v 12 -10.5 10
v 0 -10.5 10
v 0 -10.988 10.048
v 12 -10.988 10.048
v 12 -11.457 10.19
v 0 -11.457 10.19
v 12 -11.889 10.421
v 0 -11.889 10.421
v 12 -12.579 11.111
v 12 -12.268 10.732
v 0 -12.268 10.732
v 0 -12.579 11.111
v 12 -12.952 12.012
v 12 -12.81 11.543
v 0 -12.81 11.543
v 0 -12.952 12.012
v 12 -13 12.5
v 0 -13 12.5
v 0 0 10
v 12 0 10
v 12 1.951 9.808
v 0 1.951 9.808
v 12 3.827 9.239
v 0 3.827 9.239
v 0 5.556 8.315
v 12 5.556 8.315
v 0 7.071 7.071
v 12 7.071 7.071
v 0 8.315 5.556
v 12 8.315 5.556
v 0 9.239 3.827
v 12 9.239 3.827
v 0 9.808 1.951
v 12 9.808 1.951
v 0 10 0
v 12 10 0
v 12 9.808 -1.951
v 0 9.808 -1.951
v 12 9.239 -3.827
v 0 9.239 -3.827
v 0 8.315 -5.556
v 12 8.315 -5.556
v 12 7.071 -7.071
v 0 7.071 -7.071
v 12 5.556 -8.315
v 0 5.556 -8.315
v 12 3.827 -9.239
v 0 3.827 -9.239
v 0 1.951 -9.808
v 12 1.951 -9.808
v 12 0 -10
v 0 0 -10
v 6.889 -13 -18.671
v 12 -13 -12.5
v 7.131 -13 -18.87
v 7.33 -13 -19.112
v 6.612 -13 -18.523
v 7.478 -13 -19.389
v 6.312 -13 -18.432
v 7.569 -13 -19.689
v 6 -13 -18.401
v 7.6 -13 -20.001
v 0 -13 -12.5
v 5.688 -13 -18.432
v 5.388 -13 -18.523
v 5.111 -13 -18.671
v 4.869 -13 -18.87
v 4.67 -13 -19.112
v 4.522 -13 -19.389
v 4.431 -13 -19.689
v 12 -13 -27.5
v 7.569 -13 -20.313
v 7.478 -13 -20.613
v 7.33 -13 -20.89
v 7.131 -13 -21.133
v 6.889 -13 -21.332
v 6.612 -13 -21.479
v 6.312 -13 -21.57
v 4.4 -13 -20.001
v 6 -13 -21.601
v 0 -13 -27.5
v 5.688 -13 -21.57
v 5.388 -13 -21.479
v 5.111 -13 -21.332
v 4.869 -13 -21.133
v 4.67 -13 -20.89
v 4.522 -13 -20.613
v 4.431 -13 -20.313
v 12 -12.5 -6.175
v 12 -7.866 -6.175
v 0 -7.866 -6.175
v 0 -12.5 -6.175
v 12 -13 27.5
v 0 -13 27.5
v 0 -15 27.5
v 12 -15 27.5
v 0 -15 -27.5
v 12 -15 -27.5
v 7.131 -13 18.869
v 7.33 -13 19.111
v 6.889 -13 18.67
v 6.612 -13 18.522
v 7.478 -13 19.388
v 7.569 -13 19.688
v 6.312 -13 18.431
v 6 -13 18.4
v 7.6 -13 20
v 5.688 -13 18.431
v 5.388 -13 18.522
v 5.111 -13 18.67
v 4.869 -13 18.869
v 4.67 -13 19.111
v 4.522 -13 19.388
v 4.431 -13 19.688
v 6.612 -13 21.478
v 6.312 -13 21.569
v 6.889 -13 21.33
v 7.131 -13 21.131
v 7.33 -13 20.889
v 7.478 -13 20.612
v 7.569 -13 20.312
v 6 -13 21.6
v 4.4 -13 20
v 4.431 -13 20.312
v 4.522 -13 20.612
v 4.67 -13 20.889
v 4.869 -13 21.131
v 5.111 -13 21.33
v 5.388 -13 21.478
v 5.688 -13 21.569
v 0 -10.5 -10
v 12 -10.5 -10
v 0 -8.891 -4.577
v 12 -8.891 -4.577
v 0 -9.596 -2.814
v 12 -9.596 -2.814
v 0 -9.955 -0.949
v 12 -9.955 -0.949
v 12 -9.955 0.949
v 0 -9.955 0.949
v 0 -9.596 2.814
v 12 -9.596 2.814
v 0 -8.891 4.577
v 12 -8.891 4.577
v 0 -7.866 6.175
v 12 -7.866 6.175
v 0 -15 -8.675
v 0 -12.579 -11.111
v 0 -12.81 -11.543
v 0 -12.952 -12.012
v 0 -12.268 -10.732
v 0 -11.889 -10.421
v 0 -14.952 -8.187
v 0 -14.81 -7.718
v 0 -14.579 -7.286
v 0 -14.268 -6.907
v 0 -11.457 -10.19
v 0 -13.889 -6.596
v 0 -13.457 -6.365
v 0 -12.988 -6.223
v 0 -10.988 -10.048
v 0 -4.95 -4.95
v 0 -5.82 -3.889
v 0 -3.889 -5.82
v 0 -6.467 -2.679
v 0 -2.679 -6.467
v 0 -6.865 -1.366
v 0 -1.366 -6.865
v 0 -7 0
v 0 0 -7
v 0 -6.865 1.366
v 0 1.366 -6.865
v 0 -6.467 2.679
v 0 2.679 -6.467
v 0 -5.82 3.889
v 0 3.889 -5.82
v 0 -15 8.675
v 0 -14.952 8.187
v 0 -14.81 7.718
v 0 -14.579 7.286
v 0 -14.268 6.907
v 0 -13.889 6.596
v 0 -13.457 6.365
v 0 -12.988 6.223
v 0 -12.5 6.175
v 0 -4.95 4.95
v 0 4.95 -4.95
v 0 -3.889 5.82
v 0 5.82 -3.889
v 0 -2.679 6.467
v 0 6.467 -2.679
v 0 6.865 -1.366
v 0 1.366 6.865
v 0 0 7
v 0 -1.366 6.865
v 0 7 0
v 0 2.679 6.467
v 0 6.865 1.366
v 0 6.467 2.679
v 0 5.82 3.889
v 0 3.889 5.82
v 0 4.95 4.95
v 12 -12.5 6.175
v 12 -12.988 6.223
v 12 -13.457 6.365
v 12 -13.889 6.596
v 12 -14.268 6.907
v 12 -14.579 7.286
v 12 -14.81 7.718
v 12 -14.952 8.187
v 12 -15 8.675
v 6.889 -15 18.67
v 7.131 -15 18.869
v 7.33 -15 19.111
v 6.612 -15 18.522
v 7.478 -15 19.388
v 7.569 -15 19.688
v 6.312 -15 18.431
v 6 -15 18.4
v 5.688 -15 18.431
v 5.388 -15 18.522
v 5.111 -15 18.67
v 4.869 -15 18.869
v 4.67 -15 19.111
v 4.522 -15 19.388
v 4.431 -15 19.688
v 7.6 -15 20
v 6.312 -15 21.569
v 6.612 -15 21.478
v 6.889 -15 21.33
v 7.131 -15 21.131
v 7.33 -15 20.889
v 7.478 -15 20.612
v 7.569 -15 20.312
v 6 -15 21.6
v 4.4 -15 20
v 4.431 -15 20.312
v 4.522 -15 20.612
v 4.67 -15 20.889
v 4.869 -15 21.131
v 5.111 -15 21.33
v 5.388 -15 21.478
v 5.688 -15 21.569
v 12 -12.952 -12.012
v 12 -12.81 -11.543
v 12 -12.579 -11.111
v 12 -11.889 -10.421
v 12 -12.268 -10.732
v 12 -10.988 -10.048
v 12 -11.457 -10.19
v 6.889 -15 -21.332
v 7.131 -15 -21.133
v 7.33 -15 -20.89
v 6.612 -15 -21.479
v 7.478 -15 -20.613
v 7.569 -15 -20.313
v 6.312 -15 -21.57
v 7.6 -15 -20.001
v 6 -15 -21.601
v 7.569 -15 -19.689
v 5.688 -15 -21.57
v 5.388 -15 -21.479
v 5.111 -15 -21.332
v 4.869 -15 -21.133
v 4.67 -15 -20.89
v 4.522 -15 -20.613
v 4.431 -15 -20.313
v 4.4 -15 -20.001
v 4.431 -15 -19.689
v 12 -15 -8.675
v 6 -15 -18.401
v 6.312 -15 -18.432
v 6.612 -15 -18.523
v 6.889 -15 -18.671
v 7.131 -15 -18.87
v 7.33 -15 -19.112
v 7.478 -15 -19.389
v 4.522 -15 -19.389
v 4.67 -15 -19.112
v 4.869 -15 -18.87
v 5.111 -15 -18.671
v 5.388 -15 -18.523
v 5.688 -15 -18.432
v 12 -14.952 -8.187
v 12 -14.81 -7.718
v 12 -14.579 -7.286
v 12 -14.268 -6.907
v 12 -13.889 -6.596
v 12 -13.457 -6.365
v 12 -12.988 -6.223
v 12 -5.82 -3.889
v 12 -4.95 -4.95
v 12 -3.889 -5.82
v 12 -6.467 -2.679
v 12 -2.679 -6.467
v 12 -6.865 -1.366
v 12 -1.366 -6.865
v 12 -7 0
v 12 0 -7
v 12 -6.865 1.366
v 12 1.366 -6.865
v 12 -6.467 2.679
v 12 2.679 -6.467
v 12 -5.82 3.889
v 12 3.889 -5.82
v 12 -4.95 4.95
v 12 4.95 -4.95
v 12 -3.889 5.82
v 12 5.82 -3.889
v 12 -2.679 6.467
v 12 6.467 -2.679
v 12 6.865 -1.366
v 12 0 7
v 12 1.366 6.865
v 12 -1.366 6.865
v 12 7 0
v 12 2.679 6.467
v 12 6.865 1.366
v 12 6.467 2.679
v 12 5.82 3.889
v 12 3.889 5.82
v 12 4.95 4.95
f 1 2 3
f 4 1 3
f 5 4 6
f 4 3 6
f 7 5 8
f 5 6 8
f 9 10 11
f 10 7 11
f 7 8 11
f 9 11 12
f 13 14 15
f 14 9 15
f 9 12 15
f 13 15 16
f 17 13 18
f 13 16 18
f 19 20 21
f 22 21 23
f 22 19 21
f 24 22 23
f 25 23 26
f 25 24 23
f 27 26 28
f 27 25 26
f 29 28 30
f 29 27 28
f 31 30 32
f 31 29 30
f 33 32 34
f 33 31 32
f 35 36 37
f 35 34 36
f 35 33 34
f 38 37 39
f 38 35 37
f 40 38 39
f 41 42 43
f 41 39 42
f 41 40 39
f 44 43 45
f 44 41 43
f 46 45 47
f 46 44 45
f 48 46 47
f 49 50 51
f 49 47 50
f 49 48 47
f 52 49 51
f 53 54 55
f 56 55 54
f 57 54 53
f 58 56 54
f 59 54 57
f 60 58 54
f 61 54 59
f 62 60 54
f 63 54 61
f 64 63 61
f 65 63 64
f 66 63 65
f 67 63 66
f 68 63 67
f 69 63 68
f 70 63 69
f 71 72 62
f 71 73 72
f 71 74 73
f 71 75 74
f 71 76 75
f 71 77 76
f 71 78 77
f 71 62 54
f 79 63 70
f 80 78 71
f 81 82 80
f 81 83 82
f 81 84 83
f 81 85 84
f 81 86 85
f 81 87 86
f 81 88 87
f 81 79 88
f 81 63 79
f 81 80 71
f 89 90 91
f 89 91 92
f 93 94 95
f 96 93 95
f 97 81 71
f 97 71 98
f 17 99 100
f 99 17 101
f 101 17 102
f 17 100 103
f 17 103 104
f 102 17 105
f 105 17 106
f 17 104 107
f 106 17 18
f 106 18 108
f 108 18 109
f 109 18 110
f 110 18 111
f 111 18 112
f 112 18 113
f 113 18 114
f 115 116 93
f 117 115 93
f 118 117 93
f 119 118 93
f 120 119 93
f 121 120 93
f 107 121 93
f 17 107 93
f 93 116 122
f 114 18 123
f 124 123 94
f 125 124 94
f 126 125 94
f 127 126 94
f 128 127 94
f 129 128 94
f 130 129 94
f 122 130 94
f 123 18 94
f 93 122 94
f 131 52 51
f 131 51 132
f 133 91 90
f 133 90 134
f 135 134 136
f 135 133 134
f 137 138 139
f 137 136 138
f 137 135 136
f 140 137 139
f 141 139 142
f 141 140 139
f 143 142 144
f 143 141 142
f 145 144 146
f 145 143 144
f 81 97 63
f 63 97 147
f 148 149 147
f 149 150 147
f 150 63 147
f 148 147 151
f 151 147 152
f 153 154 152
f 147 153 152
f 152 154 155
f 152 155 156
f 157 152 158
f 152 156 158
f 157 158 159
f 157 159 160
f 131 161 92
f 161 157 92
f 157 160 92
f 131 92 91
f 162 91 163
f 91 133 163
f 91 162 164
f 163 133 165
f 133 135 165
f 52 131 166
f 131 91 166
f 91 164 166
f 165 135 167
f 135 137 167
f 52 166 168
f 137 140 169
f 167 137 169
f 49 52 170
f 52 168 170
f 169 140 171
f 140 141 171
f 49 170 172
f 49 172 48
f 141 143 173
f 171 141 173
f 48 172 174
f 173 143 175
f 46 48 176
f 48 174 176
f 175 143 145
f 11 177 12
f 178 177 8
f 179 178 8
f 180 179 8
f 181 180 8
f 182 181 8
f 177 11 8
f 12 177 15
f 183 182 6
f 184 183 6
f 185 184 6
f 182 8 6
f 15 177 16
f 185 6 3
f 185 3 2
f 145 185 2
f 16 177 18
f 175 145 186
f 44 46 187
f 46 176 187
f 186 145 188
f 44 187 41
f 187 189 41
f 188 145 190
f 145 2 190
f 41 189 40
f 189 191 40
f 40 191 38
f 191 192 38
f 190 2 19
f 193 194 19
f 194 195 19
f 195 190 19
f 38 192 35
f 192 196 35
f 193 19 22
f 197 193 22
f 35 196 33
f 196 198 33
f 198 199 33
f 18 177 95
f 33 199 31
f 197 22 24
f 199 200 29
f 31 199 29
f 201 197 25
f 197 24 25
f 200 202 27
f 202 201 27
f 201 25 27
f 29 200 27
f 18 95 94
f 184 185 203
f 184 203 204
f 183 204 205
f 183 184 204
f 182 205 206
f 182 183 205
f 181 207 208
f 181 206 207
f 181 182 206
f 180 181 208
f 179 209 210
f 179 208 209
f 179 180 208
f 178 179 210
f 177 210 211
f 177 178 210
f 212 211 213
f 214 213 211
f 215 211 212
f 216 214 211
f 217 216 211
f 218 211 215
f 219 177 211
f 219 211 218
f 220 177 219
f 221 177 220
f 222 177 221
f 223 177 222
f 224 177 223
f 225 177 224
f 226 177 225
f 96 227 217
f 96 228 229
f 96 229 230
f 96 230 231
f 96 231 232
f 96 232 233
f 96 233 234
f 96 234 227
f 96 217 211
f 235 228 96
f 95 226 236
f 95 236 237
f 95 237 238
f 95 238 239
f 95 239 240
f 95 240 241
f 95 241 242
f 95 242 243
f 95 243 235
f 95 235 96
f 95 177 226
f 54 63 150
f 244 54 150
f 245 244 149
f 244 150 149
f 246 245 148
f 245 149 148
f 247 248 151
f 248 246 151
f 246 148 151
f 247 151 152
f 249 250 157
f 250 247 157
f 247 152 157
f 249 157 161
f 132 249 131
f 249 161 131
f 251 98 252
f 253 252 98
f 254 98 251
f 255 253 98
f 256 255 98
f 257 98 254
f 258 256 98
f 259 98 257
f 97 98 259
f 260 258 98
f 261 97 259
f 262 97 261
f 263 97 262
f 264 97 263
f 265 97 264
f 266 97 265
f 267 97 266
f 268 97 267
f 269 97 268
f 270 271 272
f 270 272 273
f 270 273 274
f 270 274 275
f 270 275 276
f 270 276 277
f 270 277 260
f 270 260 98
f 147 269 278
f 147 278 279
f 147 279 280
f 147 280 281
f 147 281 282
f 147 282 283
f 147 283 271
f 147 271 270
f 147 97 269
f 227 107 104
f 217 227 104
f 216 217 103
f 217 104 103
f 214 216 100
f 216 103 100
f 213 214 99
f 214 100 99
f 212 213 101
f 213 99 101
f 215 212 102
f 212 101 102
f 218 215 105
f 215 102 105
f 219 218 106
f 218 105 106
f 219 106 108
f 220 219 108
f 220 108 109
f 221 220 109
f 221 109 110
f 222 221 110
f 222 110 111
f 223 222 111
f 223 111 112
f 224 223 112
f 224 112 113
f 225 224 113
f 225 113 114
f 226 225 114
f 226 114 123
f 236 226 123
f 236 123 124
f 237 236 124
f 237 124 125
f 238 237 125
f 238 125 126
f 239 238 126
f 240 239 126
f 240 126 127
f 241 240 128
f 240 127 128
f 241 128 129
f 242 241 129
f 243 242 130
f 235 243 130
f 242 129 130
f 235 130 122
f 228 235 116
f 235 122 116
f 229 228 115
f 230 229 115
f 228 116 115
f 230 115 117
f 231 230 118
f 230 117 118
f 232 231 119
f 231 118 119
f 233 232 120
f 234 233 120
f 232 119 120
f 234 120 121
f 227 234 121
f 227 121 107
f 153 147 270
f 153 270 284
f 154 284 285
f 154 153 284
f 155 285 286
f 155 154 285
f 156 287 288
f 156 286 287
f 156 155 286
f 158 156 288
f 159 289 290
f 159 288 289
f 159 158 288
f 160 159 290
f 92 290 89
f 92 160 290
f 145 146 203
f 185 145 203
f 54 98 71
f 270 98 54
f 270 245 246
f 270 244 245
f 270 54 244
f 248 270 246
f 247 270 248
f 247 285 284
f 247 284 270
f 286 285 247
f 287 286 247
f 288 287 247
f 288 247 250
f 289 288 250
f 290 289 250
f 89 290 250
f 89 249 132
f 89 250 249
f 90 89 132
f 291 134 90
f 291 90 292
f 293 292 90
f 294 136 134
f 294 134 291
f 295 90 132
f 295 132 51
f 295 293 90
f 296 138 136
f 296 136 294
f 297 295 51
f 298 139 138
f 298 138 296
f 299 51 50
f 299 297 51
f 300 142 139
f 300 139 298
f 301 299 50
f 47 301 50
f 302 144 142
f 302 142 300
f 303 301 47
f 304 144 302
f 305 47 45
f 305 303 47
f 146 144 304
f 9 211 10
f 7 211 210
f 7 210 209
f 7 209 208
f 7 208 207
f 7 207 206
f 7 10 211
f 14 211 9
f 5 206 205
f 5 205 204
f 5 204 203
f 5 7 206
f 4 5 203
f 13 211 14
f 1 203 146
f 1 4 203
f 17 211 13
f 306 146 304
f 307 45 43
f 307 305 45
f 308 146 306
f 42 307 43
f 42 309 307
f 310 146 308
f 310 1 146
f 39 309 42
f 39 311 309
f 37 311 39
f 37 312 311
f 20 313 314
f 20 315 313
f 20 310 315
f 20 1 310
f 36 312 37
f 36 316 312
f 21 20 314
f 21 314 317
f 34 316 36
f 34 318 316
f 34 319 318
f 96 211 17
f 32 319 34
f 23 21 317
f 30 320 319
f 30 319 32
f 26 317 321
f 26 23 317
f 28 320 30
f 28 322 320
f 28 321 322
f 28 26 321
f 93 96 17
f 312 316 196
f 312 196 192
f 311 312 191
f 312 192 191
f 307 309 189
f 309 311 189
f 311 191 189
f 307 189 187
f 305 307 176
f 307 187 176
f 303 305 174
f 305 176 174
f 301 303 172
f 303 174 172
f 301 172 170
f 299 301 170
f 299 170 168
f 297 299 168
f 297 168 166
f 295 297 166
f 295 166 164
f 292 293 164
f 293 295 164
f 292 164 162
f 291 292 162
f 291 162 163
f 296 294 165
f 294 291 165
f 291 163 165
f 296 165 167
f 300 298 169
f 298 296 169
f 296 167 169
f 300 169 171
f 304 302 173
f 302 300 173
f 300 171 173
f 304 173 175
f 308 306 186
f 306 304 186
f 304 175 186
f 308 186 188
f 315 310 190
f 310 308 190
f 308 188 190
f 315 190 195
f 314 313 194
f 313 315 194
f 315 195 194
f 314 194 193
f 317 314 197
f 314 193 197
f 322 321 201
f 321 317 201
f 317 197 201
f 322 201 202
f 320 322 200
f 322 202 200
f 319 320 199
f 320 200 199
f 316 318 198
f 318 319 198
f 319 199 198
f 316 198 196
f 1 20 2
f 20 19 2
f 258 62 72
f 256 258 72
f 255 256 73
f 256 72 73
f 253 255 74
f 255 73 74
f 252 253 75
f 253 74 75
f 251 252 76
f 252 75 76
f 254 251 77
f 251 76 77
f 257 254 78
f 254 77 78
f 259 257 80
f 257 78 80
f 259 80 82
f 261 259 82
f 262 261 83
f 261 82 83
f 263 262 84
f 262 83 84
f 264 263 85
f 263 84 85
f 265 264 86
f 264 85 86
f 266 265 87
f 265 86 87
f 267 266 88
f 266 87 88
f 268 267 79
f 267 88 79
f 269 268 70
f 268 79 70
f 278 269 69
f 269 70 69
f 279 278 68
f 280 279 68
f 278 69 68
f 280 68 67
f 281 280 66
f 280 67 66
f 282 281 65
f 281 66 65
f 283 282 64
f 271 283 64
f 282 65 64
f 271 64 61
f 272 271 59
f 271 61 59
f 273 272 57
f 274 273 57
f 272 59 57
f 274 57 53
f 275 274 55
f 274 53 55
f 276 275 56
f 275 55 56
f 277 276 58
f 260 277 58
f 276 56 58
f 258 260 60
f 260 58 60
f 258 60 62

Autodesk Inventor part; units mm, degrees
ref_plane "YZ Plane" through (0, 0, 0) normal (1, 0, 0) x (0, 1, 0)
ref_plane "XZ Plane" through (0, 0, 0) normal (0, 1, 0) x (-1, 0, 0)
ref_plane "XY Plane" through (0, 0, 0) normal (0, 0, 1) x (1, 0, 0)
sketch "Sketch1" plane through (0, 0, 0) normal (1, 0, 0) x (0, 1, 0)
  circle A0 centre (0, 0) radius 7
  line L0 (0, 10) -> (-10.5, 10)
  line L1 (0, -10) -> (-10.5, -10)
  line L2 (-7.8658, 6.1749) -> (-12.5, 6.1749)
  line L3 (-15, 8.6749) -> (-15, 15.4804)
  arc A1 (-13, 12.5) -> (-10.5, 10) centre (-10.5, 12.5) ccw
  arc A2 (-15, 8.6749) -> (-12.5, 6.1749) centre (-12.5, 8.6749) ccw
  line L4 (-15, 20.163) -> (-15, 15.4804)
  line L5 (0, 0) -> (-13.6801, 0) construction
  line L6 (-7.8658, -6.1749) -> (-12.5, -6.1749)
  arc A3 (-7.8658, 6.1749) -> (-7.8658, -6.1749) centre (0, 0) ccw
  arc A4 (0, -10) -> (0, 10) centre (0, 0) ccw
  line L7 (-13, 12.5) -> (-13, 27.5)
  line L8 (-13, 27.5) -> (-15, 27.5)
  line L9 (-15, 27.5) -> (-15, 20.163)
  line L10 (-7.8658, -6.1749) -> (-12.5, -6.1749)
  line L11 (-15, -8.6749) -> (-15, -15.4804)
  arc A5 (-10.5, -10) -> (-13, -12.5) centre (-10.5, -12.5) ccw
  arc A6 (-12.5, -6.1749) -> (-15, -8.6749) centre (-12.5, -8.6749) ccw
  line L12 (-15, -20.163) -> (-15, -15.4804)
  line L13 (-13, -12.5) -> (-13, -27.5)
  line L14 (-15, -27.5) -> (-15, -20.163)
  line L15 (-13, -27.5) -> (-15, -27.5)
  point P0 (-13, 10)
  point P1 (-5.25, -10)
  point P2 (-13, -10)
  dimension "d0" = 14
  dimension "d2" = 13
  dimension "d4" = 2.5
  dimension "d7" = 15
extrude "Extrusion1" add sketch "Sketch1" along normal blind 12
sketch "Sketch2" plane through (0, -13, 27.5) normal (0, 1, 0) x (1, 0, 0)
  line L0 (0, 15) -> (0, 0) construction
  line L1 (0, 15) -> (12, 15) construction
  line L2 (0, 0) -> (12, 15) construction
  line L3 (12, 15) -> (12, 0) construction
  line L4 (0, 15) -> (12, 0) construction
  circle A0 centre (6, 7.5) radius 1.6
  point P0 (0, 27.5)
  dimension "d8" = 3.2
extrude "Extrusion2" cut sketch "Sketch2" against normal blind 12
sketch "Sketch3" plane through (0, -13, -12.5) normal (0, 1, 0) x (1, 0, 0)
  line L0 (12, -3.8251) -> (12, 15) construction
  line L1 (12, 15) -> (0, 0.0025) construction
  line L2 (0, -3.8251) -> (0, 15) construction
  line L3 (12, 0.0025) -> (0, 15) construction
  circle A0 centre (6, 7.5012) radius 1.6
  point P0 (0, -12.5)
  dimension "d11" = 3.2
extrude "Extrusion3" cut sketch "Sketch3" against normal blind 12
properties part number "Soporte_cojinete"
